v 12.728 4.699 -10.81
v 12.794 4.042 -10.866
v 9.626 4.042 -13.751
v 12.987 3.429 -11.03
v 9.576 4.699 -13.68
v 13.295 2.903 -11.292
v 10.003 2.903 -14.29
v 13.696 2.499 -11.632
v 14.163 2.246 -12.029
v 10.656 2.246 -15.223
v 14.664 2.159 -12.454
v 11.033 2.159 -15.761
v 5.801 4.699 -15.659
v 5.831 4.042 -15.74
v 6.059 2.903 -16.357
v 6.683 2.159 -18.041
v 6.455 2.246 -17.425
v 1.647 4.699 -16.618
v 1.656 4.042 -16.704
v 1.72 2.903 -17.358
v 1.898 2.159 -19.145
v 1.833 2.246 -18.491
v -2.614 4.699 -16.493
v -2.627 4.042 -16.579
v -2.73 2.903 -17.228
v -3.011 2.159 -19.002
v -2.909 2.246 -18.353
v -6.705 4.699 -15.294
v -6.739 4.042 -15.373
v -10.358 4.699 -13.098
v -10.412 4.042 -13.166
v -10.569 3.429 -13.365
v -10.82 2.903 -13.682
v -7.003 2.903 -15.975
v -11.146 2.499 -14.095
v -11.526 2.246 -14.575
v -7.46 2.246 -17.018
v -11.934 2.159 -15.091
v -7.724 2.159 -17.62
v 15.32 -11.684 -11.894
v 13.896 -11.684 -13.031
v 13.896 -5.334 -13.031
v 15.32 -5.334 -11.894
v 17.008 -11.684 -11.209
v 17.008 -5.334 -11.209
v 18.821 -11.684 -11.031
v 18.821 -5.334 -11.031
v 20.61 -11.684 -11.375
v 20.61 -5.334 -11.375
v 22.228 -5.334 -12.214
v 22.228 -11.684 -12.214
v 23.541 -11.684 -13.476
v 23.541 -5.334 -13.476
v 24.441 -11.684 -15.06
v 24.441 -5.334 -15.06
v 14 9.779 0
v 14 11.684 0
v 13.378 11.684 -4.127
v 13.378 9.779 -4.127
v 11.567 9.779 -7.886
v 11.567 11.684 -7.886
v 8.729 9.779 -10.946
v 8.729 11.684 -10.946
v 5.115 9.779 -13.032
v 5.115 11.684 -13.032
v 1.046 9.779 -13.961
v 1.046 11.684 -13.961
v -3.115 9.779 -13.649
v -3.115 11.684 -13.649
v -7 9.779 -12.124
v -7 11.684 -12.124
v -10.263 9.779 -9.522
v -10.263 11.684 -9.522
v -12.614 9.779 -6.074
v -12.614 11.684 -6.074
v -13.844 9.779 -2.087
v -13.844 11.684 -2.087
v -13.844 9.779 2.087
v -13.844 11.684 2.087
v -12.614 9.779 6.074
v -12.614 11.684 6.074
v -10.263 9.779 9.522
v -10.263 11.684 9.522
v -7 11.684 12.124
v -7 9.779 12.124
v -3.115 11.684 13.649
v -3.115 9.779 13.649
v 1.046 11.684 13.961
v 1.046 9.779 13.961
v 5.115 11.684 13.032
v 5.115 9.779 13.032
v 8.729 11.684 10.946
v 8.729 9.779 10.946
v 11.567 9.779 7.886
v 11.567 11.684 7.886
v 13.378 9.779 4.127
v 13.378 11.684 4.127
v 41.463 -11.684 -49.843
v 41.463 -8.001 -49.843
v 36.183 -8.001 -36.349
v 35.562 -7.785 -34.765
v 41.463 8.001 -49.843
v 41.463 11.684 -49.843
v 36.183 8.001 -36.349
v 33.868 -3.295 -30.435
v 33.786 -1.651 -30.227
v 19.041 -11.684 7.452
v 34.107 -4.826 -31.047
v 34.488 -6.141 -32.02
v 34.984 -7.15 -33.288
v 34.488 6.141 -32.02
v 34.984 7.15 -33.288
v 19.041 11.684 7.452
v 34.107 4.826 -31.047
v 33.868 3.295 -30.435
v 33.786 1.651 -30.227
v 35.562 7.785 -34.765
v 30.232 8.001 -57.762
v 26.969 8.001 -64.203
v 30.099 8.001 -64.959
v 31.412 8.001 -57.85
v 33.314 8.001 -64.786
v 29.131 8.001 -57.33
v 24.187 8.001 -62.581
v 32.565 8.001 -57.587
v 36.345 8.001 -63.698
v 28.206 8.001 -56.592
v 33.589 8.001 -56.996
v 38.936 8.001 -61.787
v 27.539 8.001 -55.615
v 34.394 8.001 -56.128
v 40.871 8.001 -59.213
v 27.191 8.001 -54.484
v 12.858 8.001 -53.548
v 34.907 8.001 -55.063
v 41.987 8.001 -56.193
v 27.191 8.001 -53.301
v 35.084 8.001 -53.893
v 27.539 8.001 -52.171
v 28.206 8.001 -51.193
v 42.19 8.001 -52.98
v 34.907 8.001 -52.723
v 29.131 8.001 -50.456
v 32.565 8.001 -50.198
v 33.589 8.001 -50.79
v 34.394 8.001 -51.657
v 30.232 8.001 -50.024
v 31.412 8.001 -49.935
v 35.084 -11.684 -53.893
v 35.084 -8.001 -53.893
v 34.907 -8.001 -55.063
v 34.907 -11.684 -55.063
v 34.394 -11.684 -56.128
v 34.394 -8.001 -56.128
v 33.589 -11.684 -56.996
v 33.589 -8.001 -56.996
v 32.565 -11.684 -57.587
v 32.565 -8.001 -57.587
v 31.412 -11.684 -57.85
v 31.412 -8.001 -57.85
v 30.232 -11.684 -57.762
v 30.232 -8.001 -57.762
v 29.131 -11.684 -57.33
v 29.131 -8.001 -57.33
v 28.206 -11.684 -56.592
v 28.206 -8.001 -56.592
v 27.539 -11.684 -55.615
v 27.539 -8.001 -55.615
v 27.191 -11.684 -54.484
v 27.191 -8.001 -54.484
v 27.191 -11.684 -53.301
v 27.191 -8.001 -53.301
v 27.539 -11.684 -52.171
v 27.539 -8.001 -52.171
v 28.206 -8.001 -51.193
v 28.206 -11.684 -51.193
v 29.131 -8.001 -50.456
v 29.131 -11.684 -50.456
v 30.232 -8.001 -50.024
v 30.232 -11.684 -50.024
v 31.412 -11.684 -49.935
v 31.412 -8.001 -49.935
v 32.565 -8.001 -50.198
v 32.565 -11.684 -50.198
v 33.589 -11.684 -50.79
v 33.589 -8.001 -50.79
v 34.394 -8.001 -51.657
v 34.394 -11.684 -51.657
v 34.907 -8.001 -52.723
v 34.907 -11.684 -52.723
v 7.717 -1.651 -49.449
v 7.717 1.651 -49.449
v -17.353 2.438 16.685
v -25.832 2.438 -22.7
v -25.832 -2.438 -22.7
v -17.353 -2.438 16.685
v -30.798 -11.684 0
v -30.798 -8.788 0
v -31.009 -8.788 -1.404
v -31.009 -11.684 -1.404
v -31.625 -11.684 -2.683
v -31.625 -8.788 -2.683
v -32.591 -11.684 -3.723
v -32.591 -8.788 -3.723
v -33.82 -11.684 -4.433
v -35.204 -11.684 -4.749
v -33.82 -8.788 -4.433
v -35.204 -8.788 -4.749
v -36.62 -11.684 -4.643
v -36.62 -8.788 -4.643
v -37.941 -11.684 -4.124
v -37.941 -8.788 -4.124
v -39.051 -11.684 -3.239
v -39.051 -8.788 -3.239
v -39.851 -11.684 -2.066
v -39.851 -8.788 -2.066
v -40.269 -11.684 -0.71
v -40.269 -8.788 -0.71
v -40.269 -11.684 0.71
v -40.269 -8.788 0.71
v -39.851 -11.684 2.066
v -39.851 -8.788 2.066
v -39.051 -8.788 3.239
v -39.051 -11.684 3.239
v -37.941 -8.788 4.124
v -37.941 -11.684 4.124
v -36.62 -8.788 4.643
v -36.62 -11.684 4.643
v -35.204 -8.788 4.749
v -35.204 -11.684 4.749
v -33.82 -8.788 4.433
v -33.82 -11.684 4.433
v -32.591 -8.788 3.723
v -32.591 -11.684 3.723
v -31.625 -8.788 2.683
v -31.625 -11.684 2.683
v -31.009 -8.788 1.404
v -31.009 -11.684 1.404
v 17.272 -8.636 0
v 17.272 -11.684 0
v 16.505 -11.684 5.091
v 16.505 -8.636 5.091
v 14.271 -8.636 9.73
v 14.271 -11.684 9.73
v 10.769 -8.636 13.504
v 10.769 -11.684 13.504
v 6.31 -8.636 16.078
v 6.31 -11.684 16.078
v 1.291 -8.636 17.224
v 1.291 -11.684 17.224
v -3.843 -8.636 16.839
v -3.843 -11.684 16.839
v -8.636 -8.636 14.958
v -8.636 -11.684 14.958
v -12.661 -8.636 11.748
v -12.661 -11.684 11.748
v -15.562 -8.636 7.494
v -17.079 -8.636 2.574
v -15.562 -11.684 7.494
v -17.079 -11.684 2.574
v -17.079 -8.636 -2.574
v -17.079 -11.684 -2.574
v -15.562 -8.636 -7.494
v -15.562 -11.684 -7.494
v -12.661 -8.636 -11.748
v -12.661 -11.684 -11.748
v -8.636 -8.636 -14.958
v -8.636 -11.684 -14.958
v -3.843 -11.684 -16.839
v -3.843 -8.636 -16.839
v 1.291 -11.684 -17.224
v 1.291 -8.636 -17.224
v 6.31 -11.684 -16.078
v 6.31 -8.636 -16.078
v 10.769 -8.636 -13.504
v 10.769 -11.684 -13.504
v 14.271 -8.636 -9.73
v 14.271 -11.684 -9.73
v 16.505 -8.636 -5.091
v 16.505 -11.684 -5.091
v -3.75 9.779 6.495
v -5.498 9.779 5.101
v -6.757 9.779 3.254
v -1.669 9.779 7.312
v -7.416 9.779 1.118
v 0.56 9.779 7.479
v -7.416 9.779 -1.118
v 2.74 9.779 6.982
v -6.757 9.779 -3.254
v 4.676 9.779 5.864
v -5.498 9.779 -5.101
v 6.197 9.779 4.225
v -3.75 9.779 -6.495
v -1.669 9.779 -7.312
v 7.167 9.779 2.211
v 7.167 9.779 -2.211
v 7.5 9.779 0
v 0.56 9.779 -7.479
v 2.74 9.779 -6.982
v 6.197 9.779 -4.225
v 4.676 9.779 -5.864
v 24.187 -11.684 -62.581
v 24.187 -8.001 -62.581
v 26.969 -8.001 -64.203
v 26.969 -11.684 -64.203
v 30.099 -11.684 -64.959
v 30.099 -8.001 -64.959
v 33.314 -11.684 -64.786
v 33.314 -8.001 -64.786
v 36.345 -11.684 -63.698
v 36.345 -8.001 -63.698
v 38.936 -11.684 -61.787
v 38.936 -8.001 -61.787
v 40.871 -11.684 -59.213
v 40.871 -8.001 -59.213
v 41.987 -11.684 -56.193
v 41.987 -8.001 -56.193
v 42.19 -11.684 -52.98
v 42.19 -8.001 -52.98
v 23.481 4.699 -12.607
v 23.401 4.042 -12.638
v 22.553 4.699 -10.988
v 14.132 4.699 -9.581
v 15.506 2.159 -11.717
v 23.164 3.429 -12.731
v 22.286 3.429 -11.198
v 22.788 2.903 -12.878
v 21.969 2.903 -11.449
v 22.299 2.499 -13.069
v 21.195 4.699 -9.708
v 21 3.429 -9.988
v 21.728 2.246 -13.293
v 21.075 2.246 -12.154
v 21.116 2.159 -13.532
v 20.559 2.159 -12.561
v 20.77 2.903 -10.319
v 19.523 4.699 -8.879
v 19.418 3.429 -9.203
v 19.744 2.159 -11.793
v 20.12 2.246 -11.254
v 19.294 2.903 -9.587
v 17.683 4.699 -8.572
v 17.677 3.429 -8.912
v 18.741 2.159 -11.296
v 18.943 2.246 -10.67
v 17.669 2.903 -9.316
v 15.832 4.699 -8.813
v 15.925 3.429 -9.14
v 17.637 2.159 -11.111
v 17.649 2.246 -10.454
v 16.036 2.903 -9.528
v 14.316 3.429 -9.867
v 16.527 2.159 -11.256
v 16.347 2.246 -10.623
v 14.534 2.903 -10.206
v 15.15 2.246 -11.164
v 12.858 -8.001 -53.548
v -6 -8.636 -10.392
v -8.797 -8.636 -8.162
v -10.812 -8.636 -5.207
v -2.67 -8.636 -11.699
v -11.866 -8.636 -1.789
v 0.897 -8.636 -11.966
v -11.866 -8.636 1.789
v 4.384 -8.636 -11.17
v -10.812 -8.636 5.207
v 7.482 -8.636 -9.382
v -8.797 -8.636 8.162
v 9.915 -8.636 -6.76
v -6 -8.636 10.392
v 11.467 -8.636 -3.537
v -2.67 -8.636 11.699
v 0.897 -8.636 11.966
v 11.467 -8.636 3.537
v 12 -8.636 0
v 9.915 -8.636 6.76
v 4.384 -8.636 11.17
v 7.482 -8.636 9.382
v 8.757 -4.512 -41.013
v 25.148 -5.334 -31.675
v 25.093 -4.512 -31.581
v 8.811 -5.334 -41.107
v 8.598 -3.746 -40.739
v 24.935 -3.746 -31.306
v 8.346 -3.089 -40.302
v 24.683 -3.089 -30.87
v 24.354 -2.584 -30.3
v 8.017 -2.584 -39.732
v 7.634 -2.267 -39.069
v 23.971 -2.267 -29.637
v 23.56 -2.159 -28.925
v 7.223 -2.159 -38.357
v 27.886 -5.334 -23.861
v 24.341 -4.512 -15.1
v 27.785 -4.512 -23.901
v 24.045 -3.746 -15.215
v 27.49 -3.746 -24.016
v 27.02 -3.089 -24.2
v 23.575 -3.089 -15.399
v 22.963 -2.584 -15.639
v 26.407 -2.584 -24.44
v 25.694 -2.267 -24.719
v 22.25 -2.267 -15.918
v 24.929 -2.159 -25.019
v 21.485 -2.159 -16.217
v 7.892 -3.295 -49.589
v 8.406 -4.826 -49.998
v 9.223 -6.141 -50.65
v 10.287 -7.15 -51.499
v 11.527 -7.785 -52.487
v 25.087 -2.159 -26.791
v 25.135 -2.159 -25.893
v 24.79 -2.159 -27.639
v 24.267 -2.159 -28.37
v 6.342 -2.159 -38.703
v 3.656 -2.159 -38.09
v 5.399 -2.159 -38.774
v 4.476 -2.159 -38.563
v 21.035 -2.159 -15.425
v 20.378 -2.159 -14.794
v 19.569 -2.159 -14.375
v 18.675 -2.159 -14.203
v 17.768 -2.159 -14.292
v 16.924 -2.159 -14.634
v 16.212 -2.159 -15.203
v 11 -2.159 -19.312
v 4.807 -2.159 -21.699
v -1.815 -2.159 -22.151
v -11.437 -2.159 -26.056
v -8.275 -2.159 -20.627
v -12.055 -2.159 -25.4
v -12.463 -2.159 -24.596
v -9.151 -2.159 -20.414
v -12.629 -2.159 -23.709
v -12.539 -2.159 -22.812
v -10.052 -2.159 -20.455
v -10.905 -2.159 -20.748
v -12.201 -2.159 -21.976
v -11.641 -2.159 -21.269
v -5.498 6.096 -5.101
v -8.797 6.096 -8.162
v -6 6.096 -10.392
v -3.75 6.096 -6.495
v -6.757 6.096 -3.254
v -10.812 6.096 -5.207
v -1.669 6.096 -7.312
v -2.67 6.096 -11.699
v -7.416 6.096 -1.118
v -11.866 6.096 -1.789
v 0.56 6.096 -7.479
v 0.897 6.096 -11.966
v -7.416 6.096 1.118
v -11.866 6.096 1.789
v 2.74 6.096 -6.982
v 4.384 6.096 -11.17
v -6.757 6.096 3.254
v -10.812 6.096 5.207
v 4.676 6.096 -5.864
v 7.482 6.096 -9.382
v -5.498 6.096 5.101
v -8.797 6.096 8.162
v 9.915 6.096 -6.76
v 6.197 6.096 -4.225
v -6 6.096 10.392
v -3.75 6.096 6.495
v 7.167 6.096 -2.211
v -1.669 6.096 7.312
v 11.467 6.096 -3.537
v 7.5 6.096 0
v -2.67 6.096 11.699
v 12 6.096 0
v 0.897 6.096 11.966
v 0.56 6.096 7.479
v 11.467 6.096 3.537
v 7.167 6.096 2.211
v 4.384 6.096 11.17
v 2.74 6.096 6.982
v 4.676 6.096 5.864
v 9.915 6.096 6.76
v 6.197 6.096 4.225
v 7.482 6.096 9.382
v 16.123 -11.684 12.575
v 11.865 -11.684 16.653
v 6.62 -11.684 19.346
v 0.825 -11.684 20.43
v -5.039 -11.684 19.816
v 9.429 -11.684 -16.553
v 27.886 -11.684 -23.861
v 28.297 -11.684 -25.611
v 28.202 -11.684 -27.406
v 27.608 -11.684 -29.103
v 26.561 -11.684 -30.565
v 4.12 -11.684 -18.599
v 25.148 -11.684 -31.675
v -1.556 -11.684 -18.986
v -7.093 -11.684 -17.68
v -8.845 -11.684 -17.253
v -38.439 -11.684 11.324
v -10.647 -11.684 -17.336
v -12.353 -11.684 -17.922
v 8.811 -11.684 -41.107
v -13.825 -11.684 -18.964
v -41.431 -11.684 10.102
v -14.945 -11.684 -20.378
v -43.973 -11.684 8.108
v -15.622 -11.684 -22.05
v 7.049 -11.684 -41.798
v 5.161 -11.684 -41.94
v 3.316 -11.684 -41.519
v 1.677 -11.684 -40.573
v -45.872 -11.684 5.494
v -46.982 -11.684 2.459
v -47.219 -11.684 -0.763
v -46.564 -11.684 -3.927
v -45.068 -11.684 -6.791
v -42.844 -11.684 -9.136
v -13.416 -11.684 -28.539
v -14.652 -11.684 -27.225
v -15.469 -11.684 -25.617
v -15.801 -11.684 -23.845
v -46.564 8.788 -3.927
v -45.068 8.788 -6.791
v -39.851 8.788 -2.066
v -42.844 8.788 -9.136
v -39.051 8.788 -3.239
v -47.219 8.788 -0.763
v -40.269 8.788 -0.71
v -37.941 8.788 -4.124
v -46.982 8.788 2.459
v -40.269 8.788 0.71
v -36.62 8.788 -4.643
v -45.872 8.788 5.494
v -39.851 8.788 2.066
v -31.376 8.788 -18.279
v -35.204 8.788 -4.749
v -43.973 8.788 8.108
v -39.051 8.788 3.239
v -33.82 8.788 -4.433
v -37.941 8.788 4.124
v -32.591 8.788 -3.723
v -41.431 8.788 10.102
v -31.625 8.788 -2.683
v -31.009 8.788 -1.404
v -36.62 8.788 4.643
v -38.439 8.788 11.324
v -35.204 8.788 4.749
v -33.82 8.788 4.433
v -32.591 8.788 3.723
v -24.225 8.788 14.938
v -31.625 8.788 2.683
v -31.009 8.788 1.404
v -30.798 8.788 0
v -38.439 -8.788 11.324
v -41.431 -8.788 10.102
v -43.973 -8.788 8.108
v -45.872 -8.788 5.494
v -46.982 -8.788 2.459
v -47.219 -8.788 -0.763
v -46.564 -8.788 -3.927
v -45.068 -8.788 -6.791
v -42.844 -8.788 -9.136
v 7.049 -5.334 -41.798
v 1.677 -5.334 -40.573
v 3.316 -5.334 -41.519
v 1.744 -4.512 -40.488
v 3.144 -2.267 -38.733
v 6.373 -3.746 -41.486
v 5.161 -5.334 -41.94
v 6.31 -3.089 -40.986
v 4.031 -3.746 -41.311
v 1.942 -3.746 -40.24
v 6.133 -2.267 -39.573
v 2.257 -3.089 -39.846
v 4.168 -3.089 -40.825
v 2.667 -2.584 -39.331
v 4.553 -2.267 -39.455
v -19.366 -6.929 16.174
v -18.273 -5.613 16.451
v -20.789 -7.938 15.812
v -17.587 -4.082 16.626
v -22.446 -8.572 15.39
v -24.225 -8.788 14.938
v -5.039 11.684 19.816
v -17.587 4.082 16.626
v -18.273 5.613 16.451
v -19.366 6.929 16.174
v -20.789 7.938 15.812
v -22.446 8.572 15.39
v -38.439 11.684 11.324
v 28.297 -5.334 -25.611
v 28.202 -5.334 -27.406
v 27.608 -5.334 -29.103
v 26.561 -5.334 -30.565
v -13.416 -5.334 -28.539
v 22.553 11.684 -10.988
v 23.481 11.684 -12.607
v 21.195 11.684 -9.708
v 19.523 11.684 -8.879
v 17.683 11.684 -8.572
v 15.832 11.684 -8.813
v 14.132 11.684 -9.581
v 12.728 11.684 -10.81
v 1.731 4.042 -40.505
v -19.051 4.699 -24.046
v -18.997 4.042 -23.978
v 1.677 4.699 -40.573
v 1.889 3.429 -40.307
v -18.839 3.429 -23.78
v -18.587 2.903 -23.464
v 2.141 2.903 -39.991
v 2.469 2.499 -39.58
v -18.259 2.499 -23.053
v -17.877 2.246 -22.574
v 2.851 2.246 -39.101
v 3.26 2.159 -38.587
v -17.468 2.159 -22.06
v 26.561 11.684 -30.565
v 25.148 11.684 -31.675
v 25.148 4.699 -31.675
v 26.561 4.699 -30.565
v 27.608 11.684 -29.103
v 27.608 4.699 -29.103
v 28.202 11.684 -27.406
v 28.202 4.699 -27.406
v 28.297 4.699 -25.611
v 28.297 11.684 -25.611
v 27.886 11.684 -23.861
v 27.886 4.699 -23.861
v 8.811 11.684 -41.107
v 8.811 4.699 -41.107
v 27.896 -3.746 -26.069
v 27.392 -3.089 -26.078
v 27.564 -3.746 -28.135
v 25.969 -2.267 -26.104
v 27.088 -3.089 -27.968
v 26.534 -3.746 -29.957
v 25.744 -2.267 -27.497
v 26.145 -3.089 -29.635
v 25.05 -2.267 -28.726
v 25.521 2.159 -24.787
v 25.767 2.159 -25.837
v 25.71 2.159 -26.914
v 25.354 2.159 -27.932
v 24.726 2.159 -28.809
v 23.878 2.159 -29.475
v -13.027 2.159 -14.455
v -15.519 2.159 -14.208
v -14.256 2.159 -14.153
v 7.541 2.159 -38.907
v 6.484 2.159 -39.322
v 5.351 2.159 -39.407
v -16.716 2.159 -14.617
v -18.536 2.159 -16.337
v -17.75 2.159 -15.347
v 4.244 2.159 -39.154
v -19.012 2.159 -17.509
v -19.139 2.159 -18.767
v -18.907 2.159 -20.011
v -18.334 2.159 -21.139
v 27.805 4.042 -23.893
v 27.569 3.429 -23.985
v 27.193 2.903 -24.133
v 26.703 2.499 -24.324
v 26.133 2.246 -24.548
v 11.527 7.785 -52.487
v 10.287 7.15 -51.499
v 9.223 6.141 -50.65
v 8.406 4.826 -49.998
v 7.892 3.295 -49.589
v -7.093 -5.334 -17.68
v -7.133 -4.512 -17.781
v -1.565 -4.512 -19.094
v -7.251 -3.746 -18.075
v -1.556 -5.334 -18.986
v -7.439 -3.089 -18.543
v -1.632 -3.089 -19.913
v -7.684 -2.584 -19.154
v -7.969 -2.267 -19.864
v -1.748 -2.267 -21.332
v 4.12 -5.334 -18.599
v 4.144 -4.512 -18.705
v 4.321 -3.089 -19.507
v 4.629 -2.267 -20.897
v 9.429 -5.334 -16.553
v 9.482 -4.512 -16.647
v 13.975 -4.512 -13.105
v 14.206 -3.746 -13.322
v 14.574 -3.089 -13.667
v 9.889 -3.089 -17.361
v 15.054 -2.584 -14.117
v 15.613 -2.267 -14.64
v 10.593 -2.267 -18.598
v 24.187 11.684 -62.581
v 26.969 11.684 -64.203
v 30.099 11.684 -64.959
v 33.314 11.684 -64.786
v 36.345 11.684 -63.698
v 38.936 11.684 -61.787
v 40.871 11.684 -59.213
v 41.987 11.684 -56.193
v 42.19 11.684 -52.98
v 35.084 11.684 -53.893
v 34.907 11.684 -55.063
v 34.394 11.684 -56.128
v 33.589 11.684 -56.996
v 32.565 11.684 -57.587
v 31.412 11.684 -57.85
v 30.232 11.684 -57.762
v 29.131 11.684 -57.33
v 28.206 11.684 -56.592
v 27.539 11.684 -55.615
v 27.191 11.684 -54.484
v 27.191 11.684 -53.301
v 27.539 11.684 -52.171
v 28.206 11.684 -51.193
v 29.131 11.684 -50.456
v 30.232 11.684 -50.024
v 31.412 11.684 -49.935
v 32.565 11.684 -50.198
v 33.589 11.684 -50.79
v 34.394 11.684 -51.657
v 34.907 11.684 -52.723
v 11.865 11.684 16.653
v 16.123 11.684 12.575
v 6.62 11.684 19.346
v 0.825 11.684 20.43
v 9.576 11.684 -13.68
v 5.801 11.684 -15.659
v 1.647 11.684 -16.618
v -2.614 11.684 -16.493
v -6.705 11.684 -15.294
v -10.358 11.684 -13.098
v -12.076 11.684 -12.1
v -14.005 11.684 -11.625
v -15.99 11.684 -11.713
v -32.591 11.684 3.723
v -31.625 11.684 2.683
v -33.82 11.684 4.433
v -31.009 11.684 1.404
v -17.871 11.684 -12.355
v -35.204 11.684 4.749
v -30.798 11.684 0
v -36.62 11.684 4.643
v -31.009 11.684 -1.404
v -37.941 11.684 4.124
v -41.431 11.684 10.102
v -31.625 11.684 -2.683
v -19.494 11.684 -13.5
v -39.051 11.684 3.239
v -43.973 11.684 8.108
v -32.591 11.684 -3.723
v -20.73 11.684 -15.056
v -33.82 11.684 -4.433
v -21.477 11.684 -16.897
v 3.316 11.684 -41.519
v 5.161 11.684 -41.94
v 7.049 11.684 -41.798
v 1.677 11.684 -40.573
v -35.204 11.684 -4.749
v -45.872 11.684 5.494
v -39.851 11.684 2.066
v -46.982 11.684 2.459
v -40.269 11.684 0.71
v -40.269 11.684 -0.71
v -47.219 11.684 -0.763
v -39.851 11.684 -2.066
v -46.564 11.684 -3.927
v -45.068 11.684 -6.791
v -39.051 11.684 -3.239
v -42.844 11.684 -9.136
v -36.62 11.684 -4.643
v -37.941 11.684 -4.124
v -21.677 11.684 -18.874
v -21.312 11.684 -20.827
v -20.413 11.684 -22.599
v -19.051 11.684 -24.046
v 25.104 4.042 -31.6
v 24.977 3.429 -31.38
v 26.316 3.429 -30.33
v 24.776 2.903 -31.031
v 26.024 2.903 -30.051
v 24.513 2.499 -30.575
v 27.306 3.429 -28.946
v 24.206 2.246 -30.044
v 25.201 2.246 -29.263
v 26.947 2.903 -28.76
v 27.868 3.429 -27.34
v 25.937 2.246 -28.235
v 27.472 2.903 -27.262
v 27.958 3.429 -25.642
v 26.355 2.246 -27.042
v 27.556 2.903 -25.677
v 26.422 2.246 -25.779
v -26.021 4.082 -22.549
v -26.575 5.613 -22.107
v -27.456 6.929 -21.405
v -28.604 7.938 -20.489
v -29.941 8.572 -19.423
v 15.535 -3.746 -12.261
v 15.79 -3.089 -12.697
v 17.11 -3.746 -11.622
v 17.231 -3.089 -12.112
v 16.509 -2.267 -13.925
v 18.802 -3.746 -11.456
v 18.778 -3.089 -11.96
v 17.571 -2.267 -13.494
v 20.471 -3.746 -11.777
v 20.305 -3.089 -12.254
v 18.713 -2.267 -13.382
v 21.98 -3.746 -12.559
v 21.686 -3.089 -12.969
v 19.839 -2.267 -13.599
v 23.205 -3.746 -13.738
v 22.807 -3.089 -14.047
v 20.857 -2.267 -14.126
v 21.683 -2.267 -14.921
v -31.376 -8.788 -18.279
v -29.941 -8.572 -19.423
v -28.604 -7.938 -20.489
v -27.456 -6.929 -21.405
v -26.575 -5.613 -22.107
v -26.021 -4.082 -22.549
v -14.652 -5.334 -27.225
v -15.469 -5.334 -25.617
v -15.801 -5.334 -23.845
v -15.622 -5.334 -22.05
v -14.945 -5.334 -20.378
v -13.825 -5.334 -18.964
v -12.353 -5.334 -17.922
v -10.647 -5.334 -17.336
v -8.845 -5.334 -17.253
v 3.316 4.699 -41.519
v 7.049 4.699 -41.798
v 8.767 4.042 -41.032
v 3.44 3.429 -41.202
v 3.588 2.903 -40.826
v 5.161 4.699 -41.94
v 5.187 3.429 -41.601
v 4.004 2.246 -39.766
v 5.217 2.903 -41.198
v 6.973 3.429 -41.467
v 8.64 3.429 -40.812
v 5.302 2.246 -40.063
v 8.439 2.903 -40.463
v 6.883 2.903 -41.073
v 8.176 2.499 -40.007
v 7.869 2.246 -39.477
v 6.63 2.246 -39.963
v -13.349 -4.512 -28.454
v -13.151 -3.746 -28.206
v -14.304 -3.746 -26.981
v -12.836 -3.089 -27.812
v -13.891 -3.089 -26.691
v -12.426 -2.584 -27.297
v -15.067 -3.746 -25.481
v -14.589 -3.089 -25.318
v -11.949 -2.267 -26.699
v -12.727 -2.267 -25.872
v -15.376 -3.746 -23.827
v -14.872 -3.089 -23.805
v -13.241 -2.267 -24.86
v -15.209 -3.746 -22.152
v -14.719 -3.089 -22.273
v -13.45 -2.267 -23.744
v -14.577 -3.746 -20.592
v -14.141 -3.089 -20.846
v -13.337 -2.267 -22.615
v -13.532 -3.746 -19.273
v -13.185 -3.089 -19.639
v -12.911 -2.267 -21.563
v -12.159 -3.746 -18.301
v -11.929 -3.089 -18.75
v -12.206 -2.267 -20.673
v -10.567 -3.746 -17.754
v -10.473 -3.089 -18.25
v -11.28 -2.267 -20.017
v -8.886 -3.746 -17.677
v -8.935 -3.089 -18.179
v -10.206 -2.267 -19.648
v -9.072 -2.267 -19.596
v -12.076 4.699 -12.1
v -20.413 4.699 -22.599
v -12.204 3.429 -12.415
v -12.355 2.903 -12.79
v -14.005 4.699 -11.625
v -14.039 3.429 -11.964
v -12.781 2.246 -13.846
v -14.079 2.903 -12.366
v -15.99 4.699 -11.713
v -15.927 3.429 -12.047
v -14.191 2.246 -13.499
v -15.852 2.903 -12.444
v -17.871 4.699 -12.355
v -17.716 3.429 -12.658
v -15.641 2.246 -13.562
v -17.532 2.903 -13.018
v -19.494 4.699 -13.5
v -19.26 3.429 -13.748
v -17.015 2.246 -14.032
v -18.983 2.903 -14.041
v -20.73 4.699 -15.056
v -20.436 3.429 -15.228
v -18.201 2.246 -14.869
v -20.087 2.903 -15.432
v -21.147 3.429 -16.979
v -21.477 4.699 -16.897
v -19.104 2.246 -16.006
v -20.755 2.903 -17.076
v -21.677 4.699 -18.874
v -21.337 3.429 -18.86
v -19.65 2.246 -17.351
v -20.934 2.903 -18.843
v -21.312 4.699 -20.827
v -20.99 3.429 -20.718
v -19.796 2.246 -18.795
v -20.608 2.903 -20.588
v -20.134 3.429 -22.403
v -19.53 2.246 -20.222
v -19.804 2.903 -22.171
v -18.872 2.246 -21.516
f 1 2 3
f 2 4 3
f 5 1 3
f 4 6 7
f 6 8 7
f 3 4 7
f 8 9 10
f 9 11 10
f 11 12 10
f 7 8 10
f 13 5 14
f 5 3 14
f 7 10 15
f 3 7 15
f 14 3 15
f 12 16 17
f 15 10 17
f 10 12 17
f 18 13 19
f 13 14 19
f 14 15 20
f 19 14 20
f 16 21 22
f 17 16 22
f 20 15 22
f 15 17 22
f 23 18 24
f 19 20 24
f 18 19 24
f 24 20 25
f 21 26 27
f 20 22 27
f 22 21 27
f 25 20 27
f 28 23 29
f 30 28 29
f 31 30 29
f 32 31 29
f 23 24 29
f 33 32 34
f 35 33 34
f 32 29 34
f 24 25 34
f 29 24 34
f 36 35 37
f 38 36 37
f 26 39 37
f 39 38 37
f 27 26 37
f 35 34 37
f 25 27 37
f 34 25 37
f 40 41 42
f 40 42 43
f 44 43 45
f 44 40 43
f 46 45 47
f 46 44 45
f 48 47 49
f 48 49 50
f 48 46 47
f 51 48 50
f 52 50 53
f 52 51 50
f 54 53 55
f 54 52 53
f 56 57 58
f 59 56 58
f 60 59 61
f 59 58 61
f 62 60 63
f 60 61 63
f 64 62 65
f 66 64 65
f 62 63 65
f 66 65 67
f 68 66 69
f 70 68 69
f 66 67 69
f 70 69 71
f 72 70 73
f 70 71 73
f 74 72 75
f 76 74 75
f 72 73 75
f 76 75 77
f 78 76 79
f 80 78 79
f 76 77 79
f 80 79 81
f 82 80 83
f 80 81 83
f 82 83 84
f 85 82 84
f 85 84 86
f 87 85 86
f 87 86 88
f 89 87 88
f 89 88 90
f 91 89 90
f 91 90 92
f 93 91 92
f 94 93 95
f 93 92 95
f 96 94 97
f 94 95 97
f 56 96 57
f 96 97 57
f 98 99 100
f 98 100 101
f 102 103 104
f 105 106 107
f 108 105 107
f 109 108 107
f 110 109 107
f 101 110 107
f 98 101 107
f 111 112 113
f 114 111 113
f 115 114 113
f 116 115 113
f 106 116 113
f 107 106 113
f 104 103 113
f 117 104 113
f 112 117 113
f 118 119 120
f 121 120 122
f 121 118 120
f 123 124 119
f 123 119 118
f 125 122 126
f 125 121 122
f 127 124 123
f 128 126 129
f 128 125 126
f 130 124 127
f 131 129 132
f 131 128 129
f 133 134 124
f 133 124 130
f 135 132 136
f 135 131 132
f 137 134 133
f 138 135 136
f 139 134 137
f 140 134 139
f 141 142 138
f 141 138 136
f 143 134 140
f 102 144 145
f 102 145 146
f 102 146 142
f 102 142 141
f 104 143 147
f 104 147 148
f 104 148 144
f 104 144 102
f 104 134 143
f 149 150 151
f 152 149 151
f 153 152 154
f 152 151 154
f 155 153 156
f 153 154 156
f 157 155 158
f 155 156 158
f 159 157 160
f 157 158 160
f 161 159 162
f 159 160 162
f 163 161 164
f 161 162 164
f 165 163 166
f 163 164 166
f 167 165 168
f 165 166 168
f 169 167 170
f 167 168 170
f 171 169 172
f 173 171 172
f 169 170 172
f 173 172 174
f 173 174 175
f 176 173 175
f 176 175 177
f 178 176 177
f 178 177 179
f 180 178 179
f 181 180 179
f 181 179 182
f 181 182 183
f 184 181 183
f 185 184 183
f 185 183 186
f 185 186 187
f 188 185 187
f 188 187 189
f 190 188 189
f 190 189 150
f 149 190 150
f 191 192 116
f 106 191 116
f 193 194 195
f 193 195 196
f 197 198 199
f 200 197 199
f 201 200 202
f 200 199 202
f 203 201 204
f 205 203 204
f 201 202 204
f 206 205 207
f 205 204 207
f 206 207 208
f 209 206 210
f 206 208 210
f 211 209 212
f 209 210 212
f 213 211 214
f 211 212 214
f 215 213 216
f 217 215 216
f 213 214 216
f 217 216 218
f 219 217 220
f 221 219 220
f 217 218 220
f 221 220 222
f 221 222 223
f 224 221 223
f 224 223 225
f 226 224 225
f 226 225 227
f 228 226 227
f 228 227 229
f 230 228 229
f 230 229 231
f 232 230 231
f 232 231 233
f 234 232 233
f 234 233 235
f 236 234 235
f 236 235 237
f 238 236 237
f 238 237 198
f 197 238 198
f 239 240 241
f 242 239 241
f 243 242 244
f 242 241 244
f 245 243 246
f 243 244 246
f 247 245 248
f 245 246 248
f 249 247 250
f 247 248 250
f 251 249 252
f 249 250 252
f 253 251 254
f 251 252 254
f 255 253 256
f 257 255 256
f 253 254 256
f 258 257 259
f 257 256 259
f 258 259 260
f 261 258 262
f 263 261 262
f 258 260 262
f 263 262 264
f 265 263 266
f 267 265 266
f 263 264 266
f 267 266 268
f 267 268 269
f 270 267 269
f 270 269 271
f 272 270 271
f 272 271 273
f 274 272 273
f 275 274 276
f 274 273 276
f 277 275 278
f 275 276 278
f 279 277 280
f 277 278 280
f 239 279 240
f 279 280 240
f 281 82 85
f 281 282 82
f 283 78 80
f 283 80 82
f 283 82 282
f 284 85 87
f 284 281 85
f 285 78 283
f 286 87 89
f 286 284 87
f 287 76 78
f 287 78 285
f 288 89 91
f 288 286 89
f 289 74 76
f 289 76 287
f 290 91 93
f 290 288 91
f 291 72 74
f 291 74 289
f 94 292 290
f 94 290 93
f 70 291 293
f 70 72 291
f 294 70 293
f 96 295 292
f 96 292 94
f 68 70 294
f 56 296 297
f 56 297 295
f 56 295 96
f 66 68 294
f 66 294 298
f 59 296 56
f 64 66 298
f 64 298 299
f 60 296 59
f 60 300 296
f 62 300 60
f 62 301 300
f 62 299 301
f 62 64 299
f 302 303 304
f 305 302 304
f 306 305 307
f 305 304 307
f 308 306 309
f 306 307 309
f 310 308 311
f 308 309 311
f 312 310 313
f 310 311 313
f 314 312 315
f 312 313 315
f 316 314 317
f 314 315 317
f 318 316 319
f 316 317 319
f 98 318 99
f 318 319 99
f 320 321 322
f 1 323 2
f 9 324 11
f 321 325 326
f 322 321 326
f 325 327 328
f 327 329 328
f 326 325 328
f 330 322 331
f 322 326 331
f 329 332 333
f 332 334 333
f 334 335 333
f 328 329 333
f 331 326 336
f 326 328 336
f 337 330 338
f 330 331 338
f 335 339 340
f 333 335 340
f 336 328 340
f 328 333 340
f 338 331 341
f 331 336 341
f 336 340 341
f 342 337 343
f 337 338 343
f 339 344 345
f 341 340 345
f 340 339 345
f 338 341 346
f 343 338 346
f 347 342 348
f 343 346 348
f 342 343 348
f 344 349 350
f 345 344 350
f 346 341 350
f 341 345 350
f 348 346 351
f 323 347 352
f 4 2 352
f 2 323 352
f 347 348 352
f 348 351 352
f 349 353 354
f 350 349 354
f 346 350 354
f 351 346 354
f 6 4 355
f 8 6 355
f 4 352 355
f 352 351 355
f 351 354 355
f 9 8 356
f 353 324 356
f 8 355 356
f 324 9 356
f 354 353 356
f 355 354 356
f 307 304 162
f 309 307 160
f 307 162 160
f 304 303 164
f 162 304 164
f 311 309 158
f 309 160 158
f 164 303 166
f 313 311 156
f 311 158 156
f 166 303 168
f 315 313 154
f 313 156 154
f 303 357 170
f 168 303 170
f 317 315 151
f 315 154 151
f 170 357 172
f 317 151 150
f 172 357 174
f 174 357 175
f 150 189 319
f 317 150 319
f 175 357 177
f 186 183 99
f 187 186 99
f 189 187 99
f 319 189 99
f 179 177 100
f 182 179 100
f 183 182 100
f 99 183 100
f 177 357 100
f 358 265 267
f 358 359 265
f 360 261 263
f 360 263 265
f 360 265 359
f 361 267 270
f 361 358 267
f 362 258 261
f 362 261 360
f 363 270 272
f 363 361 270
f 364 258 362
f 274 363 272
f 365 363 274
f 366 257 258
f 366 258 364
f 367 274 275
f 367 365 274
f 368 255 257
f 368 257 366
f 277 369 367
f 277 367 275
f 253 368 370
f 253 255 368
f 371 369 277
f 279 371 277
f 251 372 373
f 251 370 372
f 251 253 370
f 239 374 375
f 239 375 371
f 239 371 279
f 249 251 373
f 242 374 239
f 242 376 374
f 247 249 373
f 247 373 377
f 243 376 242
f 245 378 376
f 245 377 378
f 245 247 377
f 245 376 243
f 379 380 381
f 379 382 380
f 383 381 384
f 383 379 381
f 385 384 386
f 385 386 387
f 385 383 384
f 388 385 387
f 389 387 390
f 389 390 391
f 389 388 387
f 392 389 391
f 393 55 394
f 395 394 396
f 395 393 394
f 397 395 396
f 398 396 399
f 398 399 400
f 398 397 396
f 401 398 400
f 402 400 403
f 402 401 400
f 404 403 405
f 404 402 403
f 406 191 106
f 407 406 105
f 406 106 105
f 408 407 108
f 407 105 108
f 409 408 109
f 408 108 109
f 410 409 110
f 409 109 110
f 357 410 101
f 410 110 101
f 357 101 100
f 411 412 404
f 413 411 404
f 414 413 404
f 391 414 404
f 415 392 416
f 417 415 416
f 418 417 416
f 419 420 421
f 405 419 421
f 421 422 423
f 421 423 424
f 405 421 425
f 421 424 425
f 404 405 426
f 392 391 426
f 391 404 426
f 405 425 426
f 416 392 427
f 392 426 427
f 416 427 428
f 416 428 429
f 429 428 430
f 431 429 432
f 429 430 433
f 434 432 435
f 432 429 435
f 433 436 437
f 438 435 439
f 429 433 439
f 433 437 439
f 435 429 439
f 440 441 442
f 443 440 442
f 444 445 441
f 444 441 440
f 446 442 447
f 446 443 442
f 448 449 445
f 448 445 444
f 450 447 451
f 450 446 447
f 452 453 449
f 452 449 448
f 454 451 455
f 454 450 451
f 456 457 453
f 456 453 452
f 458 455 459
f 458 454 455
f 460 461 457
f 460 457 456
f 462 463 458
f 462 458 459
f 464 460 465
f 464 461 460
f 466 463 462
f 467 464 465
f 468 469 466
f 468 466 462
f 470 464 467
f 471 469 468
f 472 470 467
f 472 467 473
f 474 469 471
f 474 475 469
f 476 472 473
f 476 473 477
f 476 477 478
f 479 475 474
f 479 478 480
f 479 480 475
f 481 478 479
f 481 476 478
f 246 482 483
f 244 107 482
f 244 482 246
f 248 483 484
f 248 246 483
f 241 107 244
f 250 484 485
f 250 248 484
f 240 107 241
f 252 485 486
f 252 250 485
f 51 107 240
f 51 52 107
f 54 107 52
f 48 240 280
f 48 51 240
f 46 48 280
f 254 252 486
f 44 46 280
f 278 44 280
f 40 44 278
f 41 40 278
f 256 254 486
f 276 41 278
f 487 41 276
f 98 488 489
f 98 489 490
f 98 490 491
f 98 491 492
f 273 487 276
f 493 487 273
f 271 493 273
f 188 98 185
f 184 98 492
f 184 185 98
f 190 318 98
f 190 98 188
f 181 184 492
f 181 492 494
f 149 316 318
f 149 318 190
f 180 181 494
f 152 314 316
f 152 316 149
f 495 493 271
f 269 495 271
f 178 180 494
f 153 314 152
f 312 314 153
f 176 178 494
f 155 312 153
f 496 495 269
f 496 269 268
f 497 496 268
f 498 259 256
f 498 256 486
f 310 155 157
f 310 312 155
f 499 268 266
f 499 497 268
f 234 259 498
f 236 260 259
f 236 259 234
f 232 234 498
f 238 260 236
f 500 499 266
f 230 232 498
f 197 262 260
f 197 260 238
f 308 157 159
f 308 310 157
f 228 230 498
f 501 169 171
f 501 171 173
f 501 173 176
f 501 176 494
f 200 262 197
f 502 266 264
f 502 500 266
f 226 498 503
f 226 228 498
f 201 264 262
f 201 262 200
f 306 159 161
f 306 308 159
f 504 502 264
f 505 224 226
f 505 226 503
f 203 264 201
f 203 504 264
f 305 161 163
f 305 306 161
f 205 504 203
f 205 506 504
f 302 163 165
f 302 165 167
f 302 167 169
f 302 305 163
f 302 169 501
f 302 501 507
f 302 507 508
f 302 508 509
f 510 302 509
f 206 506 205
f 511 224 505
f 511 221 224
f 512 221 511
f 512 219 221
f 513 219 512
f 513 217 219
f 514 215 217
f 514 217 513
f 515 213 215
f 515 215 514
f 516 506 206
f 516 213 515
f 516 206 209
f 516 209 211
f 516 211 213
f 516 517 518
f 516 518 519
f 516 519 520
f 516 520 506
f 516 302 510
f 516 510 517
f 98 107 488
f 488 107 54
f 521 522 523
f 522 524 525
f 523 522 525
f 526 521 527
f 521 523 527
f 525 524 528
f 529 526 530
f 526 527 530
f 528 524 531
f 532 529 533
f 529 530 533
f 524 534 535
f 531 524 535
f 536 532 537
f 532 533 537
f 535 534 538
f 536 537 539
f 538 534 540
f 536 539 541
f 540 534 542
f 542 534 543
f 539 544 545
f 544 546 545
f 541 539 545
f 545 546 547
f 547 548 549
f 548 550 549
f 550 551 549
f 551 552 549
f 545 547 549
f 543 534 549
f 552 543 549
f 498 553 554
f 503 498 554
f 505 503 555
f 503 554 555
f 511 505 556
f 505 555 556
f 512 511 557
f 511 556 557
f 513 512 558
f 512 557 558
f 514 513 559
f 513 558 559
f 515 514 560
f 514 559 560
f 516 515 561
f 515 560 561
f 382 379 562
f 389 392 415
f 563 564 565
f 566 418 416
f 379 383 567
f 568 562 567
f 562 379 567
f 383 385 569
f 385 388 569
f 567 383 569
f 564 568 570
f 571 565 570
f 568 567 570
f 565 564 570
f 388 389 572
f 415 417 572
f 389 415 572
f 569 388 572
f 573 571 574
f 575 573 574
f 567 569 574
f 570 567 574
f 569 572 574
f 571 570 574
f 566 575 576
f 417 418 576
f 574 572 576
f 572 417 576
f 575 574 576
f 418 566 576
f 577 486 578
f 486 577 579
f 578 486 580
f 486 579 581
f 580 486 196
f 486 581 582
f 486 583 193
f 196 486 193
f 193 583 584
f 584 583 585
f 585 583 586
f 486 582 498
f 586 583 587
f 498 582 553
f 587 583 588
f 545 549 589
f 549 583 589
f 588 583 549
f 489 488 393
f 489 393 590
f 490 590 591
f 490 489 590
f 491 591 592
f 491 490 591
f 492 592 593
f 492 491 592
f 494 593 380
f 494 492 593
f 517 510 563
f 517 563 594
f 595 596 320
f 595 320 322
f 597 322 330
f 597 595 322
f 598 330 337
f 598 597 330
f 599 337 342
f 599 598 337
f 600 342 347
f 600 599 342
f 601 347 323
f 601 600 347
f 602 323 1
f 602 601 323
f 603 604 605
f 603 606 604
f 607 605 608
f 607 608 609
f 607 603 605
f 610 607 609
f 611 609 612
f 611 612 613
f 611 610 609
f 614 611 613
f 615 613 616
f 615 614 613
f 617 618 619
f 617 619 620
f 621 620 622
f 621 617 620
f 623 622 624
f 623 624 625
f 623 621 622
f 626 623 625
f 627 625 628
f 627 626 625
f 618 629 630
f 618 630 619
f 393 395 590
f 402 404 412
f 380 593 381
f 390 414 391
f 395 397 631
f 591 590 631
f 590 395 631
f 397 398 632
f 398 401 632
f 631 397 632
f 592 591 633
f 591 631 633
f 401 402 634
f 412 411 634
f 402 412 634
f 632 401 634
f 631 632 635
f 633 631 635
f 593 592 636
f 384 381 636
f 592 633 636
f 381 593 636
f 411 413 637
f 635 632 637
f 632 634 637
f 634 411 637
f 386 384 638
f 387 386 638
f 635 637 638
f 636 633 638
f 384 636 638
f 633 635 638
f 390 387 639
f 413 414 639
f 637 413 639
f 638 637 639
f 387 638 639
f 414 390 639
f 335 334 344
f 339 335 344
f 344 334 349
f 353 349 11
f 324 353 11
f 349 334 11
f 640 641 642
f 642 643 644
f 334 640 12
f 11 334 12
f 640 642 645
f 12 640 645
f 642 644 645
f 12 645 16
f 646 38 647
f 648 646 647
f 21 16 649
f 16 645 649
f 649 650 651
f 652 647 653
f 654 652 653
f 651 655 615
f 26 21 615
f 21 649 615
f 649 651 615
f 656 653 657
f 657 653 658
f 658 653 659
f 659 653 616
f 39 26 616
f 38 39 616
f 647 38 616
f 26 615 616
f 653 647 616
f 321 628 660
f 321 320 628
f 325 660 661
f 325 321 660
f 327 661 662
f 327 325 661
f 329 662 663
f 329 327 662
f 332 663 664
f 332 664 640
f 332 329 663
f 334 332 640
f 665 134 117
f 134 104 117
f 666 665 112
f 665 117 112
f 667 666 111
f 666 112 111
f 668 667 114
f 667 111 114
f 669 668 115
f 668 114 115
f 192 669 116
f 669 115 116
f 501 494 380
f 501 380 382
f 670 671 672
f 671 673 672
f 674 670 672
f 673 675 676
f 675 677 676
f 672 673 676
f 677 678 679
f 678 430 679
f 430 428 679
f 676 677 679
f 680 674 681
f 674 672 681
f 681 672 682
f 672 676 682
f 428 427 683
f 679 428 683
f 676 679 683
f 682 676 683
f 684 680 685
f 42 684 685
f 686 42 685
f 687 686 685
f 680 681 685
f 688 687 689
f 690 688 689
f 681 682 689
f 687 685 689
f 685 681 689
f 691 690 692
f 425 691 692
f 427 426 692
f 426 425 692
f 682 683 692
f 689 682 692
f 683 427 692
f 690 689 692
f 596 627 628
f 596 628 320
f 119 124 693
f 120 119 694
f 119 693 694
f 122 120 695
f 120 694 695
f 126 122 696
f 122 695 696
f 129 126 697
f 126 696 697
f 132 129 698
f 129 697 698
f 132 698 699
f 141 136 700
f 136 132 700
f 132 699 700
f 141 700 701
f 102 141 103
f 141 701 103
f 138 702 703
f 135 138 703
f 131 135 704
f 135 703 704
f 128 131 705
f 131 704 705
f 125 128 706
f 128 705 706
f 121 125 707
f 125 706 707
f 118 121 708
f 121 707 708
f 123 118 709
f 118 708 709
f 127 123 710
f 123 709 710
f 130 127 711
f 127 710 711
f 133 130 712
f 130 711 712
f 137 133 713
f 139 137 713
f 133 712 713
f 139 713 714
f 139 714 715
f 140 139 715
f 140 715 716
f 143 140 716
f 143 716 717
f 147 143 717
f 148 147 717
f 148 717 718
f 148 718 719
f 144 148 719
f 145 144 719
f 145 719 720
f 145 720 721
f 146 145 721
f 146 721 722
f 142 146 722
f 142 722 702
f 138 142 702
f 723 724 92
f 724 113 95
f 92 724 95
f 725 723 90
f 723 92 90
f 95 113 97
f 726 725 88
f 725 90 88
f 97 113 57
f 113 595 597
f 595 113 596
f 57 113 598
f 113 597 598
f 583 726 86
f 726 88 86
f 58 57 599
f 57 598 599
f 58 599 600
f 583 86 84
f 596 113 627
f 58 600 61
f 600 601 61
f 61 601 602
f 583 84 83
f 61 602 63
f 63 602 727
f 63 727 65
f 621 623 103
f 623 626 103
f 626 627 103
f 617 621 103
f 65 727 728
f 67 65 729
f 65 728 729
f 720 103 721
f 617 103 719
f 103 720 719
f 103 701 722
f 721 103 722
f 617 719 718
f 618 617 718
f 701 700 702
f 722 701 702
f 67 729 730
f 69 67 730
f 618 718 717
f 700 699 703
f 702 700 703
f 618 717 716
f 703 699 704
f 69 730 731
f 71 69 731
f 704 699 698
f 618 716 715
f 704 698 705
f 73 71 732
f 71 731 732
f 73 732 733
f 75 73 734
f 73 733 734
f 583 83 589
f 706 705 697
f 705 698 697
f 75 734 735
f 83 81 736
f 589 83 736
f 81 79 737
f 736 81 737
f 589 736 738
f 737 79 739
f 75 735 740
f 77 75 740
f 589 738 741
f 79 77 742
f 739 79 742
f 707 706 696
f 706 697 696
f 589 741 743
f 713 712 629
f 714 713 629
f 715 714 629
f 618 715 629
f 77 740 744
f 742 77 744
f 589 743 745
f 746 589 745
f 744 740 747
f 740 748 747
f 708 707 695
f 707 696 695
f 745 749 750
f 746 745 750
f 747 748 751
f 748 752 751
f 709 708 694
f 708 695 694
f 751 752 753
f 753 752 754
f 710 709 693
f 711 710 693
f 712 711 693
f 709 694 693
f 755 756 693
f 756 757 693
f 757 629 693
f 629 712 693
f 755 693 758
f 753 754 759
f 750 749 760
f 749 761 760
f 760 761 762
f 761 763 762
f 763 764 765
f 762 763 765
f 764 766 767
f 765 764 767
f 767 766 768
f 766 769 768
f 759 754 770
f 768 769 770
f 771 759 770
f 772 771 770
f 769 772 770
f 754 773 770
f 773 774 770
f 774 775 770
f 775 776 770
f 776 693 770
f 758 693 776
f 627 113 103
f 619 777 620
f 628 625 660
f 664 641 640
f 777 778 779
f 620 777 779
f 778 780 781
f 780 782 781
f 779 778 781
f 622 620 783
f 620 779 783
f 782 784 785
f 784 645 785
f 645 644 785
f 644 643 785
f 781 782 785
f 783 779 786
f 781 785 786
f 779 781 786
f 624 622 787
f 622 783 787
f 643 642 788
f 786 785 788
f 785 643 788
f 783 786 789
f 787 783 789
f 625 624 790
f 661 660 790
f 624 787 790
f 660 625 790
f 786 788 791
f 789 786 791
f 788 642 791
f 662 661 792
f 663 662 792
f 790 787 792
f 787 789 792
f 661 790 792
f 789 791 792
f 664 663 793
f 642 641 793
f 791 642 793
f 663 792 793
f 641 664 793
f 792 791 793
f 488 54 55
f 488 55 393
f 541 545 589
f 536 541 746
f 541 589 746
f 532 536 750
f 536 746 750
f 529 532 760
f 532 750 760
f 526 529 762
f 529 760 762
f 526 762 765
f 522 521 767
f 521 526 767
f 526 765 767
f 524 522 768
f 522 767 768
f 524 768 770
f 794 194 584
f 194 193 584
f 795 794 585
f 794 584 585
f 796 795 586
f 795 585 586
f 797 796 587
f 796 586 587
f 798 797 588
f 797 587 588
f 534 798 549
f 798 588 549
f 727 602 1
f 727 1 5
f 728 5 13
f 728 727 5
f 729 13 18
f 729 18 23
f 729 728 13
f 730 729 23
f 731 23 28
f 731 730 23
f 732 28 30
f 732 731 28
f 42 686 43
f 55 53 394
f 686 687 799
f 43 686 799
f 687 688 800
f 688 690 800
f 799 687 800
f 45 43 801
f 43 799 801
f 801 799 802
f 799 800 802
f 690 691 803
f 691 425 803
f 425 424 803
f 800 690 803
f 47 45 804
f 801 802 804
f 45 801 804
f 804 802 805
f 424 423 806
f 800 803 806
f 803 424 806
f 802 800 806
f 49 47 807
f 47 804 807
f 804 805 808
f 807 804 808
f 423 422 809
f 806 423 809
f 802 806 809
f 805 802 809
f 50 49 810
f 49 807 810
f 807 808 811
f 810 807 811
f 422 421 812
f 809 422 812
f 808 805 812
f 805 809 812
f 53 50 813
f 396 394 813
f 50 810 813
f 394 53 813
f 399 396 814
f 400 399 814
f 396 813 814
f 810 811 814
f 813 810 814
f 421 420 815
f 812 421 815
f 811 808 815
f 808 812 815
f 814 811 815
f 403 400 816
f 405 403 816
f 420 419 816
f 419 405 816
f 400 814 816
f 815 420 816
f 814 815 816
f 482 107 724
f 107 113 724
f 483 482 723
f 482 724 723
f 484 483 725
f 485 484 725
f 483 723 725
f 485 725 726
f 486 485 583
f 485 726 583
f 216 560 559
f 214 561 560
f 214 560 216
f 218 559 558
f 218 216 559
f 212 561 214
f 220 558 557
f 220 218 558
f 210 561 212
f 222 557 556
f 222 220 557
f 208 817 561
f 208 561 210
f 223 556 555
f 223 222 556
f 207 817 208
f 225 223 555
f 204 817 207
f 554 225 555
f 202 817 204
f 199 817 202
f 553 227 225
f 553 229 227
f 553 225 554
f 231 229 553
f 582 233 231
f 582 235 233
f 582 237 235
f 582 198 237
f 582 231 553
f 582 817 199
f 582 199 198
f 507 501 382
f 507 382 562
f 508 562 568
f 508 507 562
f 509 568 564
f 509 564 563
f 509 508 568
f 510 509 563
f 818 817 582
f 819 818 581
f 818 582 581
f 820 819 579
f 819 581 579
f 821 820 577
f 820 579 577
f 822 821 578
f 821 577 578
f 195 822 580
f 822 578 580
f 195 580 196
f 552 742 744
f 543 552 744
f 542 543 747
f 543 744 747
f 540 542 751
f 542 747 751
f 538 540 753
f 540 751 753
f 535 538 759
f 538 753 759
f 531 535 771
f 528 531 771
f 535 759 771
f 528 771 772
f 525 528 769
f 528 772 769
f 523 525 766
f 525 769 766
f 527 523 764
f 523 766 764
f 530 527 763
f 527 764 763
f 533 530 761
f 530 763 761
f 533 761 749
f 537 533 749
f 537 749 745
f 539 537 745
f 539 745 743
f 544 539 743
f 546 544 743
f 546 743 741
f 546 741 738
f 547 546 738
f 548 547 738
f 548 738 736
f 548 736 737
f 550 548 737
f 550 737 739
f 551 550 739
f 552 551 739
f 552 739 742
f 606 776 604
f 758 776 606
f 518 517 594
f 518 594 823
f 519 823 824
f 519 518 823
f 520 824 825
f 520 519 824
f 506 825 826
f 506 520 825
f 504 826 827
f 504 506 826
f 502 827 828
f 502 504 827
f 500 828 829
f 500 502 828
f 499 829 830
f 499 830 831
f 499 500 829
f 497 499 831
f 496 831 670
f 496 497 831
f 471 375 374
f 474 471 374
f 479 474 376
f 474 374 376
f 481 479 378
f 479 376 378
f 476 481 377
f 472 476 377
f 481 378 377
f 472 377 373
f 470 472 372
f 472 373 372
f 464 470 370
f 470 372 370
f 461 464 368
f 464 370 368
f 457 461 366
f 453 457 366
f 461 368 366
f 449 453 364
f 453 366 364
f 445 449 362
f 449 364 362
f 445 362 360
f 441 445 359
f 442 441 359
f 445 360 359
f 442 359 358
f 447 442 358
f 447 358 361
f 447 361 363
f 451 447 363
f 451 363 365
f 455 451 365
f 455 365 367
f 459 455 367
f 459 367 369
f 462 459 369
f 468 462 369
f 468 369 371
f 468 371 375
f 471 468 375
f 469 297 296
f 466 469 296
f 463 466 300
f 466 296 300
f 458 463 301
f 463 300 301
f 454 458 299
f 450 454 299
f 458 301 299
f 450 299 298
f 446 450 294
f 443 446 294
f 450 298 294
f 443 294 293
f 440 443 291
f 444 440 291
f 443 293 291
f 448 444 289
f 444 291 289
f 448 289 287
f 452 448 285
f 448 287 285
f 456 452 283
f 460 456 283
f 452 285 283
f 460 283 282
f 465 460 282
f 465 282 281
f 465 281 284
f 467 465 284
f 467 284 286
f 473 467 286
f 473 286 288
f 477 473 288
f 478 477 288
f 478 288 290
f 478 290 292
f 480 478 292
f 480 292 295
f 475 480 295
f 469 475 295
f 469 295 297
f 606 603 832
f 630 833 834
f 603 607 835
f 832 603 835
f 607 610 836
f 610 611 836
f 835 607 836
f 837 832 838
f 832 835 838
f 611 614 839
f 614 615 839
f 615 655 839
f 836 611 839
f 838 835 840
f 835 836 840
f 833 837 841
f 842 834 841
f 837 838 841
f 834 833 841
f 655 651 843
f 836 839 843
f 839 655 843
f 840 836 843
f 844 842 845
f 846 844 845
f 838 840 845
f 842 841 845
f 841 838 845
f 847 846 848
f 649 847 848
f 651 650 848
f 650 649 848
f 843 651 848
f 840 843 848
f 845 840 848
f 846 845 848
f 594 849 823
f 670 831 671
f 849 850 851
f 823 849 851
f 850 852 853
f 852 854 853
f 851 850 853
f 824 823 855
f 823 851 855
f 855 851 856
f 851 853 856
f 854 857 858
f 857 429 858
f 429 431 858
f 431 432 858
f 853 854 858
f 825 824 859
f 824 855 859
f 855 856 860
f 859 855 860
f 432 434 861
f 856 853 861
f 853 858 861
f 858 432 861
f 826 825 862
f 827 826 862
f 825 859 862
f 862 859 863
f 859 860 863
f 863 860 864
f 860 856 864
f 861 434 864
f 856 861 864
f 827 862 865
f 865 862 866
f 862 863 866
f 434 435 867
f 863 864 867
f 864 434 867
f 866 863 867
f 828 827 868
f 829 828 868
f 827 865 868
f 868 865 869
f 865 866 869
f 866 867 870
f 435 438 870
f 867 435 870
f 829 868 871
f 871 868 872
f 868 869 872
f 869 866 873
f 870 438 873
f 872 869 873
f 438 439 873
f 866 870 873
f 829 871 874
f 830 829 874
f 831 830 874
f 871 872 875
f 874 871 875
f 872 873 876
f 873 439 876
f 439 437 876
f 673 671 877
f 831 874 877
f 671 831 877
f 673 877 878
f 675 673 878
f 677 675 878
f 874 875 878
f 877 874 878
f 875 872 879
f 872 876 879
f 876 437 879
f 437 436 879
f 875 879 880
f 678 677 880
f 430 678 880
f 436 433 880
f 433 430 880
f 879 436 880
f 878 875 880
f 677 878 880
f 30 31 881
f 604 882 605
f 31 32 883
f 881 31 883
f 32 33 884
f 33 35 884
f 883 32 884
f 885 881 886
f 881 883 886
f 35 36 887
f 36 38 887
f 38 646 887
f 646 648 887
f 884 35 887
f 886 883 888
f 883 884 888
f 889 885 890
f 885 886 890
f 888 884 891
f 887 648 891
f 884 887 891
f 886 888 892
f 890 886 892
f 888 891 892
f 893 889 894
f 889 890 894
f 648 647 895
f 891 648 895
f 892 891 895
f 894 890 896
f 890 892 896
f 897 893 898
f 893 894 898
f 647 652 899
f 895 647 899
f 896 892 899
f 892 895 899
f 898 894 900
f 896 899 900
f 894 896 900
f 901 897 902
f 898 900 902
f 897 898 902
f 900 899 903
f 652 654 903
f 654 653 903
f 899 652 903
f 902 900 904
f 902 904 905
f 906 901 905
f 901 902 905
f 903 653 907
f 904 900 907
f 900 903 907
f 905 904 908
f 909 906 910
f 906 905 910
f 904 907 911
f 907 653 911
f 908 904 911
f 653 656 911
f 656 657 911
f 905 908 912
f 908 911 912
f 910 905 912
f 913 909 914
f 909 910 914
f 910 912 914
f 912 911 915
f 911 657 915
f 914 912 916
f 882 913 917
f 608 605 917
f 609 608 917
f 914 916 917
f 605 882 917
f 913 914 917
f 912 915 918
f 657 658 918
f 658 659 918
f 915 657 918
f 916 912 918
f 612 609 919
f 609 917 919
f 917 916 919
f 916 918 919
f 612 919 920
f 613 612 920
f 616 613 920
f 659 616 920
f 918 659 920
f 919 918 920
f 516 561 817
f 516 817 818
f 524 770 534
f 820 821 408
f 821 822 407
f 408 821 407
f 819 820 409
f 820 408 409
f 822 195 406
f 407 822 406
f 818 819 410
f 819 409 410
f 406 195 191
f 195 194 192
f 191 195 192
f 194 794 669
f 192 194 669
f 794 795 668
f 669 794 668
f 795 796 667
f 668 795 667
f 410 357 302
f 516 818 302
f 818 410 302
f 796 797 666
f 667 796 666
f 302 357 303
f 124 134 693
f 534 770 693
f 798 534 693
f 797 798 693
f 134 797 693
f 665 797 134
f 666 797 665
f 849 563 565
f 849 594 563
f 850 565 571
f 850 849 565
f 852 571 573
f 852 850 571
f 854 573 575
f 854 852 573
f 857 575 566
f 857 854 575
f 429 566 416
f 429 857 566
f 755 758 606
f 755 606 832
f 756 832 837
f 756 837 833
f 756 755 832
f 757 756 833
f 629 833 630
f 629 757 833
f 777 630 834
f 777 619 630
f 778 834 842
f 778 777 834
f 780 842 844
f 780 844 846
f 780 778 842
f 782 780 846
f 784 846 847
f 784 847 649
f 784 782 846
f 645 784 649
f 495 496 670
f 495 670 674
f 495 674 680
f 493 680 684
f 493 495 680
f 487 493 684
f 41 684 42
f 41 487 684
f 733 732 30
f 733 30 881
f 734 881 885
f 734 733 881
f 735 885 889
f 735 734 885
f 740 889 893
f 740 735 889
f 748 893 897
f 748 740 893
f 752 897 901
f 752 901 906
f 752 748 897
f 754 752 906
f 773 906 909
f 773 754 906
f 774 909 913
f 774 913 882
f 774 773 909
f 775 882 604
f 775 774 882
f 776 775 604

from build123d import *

# Parameters (mm, degrees)
BOSS_EXTRUDE2_DEPTH = 11.684
SKETCH3_R           = 12
CUT_EXTRUDE1_DEPTH  = 17.78
SKETCH5_R           = 4.7625
SKETCH5_R_2         = 3.96875
CUT_EXTRUDE3_DEPTH  = 24.368
SKETCH4_R           = 7.5
CUT_EXTRUDE2_DEPTH  = 24.368
CUT_EXTRUDE4_DEPTH  = 9.525
CUT_EXTRUDE5_DEPTH  = 9.525
SKETCH10_R          = 14
CUT_EXTRUDE6_DEPTH  = 1.905
CUT_EXTRUDE7_REACH  = 35.001
SKETCH12_W          = 38.1
SKETCH12_H          = 16.002
CUT_EXTRUDE8_REACH  = 32.013
SKETCH15_W          = 50.8
SKETCH15_H          = 17.5768
FILLET2_R           = 3.175
FILLET3_R           = 6.35
FILLET4_R           = 2.54
SKETCH16_R          = 17.272
CUT_EXTRUDE9_DEPTH  = 3.048


with BuildPart() as part:
    # Sketch2 → Boss-Extrude2 (new body, symmetric)
    with BuildSketch(Plane(origin=(0, 0, 0), x_dir=(1, 0, 0), z_dir=(0, 1, 0))):
        with BuildLine():
            Line((-42.844042296, 9.135566968), (24.187242381, 62.581479461))
            ThreePointArc((24.187242381, 62.581479461), (37.709893542, 62.836755255), (41.463262143, 49.842930403))
            Line((41.463262143, 49.842930403), (19.040802343, -7.451688072))
            ThreePointArc((19.040802343, -7.451688072), (9.340036317, -18.189104722), (-5.038725, -19.816434073))
            Line((-5.038725, -19.816434073), (-38.439271429, -11.323676613))
            ThreePointArc((-38.439271429, -11.323676613), (-46.982276413, -2.459157895), (-42.844042296, 9.135566968))
        make_face()
    extrude(amount=BOSS_EXTRUDE2_DEPTH, both=True)

    # Sketch3 → Cut-Extrude1 (cut)
    with BuildSketch(Plane.XZ.offset(11.684)):
        Circle(SKETCH3_R)
    extrude(amount=-CUT_EXTRUDE1_DEPTH, mode=Mode.SUBTRACT)

    # Sketch5 → Cut-Extrude3 (cut, through all)
    with BuildSketch(Plane(origin=(0, 11.684, 0), x_dir=(1, 0, 0), z_dir=(0, 1, 0))):
        with Locations((-35.56, 0)):
            Circle(SKETCH5_R)
        with Locations((31.115, 53.892760878)):
            Circle(SKETCH5_R_2)
    extrude(amount=-CUT_EXTRUDE3_DEPTH, mode=Mode.SUBTRACT)

    # Sketch4 → Cut-Extrude2 (cut, through all)
    with BuildSketch(Plane(origin=(0, 11.684, 0), x_dir=(1, 0, 0), z_dir=(0, 1, 0))):
        Circle(SKETCH4_R)
    extrude(amount=-CUT_EXTRUDE2_DEPTH, mode=Mode.SUBTRACT)

    # Sketch6 → Cut-Extrude4 (cut)
    with BuildSketch(Plane(origin=(0, 11.684, 0), x_dir=(1, 0, 0), z_dir=(0, 1, 0))):
        with BuildLine():
            Line((8.810645098, 41.106966719), (25.147527575, 31.674863223))
            ThreePointArc((25.147527575, 31.674863223), (27.965170287, 28.275776503), (27.885820228, 23.861413067))
            Line((27.885820228, 23.861413067), (23.481205903, 12.606595374))
            ThreePointArc((23.481205903, 12.606595374), (18.614262725, 8.65758593), (12.727975438, 10.810127095))
            ThreePointArc((12.727975438, 10.810127095), (1.647083767, 16.617680994), (-10.358254645, 13.098349791))
            ThreePointArc((-10.358254645, 13.098349791), (-20.167393041, 14.234267976), (-19.051094323, 24.045658467))
            Line((-19.051094323, 24.045658467), (1.676926459, 40.572687453))
            ThreePointArc((1.676926459, 40.572687453), (5.16139062, 41.939970615), (8.810645098, 41.106966719))
        make_face()
    extrude(amount=-CUT_EXTRUDE4_DEPTH, mode=Mode.SUBTRACT)

    # Sketch8 → Cut-Extrude5 (cut)
    with BuildSketch(Plane.XZ.offset(11.684)):
        with BuildLine():
            Line((25.147527575, -31.674863223), (8.810645098, -41.106966719))
            ThreePointArc((8.810645098, -41.106966719), (5.16139062, -41.939970615), (1.676926459, -40.572687453))
            Line((1.676926459, -40.572687453), (-13.415958874, -28.5387091))
            ThreePointArc((-13.415958874, -28.5387091), (-14.944664248, -20.378311947), (-7.092930176, -17.680295289))
            ThreePointArc((-7.092930176, -17.680295289), (4.120108003, -18.599118529), (13.896097136, -13.030770675))
            ThreePointArc((13.896097136, -13.030770675), (19.728139709, -11.138779489), (24.441422168, -15.060172058))
            Line((24.441422168, -15.060172058), (27.885820228, -23.861413067))
            ThreePointArc((27.885820228, -23.861413067), (27.965170287, -28.275776503), (25.147527575, -31.674863223))
        make_face()
    extrude(amount=-CUT_EXTRUDE5_DEPTH, mode=Mode.SUBTRACT)

    # Sketch10 → Cut-Extrude6 (cut)
    with BuildSketch(Plane(origin=(0, 11.684, 0), x_dir=(1, 0, 0), z_dir=(0, 1, 0))):
        Circle(SKETCH10_R)
    extrude(amount=-CUT_EXTRUDE6_DEPTH, mode=Mode.SUBTRACT)

    # Sketch12 → Cut-Extrude7 (cut, up to next)
    with BuildSketch(Plane(origin=(26.337597963, 0, -35.719049385), x_dir=(0.804858887, 0, 0.593466235), z_dir=(-0.593466235, 0, 0.804858887)), mode=Mode.PRIVATE) as cut_extrude7_sk1:
        with Locations((-6.94034966, 0)):
            Rectangle(SKETCH12_W, SKETCH12_H)
    cut_extrude7_tool1 = extrude(cut_extrude7_sk1.sketch, amount=-CUT_EXTRUDE7_REACH, mode=Mode.PRIVATE) & part.part
    add(cut_extrude7_tool1.solids().sort_by_distance((20.751596, 0, -39.837913))[0], mode=Mode.SUBTRACT)

    # Sketch15 → Cut-Extrude8 (cut, up to next)
    with BuildSketch(Plane(origin=(-20.01728519, 0, 4.309619478), x_dir=(0.210472261, 0, 0.97759983), z_dir=(-0.97759983, 0, 0.210472261)), mode=Mode.PRIVATE) as cut_extrude8_sk1:
        with Locations((-7.484393594, 0)):
            Rectangle(SKETCH15_W, SKETCH15_H)
    cut_extrude8_tool1 = extrude(cut_extrude8_sk1.sketch, amount=CUT_EXTRUDE8_REACH, mode=Mode.PRIVATE) & part.part
    add(cut_extrude8_tool1.solids().sort_by_distance((-21.592542, 0, -3.007122))[0], mode=Mode.SUBTRACT)

    # Fillet2
    fillet2_edges = [part.edges().sort_by_distance(p)[0] for p in [
        (19.728139709, -2.159, -11.138779489),
        (26.163621198, -2.159, -19.460792562),
        (27.965170287, -2.159, -28.275776503),
        (16.979086336, -2.159, -36.390914971),
        (5.16139062, -2.159, -41.939970615),
        (-5.869516208, -2.159, -34.555698277),
        (-14.944664248, -2.159, -20.378311947),
        (4.120108003, -2.159, -18.599118529),
    ]]
    fillet(fillet2_edges, radius=FILLET2_R)

    # Fillet3
    fillet3_edges = [part.edges().sort_by_distance(p)[0] for p in [
        (20.751595863, -8.001, -39.83791257),
        (20.751595863, 8.001, -39.83791257),
        (-21.59254243, -8.7884, -3.007122426),
        (-21.59254243, 8.7884, -3.007122426),
    ]]
    fillet(fillet3_edges, radius=FILLET3_R)

    # Fillet4
    fillet4_edges = [part.edges().sort_by_distance(p)[0] for p in [
        (-20.167393041, 2.159, -14.234267976),
        (-8.687083932, 2.159, -32.30917296),
        (5.16139062, 2.159, -41.939970615),
        (16.979086336, 2.159, -36.390914971),
        (27.965170287, 2.159, -28.275776503),
        (25.683513065, 2.159, -18.234004221),
        (18.614262725, 2.159, -8.65758593),
        (1.647083767, 2.159, -16.617680994),
    ]]
    fillet(fillet4_edges, radius=FILLET4_R)

    # Sketch16 → Cut-Extrude9 (cut)
    with BuildSketch(Plane.XZ.offset(11.684)):
        Circle(SKETCH16_R)
    extrude(amount=-CUT_EXTRUDE9_DEPTH, mode=Mode.SUBTRACT)


solid = part.part
